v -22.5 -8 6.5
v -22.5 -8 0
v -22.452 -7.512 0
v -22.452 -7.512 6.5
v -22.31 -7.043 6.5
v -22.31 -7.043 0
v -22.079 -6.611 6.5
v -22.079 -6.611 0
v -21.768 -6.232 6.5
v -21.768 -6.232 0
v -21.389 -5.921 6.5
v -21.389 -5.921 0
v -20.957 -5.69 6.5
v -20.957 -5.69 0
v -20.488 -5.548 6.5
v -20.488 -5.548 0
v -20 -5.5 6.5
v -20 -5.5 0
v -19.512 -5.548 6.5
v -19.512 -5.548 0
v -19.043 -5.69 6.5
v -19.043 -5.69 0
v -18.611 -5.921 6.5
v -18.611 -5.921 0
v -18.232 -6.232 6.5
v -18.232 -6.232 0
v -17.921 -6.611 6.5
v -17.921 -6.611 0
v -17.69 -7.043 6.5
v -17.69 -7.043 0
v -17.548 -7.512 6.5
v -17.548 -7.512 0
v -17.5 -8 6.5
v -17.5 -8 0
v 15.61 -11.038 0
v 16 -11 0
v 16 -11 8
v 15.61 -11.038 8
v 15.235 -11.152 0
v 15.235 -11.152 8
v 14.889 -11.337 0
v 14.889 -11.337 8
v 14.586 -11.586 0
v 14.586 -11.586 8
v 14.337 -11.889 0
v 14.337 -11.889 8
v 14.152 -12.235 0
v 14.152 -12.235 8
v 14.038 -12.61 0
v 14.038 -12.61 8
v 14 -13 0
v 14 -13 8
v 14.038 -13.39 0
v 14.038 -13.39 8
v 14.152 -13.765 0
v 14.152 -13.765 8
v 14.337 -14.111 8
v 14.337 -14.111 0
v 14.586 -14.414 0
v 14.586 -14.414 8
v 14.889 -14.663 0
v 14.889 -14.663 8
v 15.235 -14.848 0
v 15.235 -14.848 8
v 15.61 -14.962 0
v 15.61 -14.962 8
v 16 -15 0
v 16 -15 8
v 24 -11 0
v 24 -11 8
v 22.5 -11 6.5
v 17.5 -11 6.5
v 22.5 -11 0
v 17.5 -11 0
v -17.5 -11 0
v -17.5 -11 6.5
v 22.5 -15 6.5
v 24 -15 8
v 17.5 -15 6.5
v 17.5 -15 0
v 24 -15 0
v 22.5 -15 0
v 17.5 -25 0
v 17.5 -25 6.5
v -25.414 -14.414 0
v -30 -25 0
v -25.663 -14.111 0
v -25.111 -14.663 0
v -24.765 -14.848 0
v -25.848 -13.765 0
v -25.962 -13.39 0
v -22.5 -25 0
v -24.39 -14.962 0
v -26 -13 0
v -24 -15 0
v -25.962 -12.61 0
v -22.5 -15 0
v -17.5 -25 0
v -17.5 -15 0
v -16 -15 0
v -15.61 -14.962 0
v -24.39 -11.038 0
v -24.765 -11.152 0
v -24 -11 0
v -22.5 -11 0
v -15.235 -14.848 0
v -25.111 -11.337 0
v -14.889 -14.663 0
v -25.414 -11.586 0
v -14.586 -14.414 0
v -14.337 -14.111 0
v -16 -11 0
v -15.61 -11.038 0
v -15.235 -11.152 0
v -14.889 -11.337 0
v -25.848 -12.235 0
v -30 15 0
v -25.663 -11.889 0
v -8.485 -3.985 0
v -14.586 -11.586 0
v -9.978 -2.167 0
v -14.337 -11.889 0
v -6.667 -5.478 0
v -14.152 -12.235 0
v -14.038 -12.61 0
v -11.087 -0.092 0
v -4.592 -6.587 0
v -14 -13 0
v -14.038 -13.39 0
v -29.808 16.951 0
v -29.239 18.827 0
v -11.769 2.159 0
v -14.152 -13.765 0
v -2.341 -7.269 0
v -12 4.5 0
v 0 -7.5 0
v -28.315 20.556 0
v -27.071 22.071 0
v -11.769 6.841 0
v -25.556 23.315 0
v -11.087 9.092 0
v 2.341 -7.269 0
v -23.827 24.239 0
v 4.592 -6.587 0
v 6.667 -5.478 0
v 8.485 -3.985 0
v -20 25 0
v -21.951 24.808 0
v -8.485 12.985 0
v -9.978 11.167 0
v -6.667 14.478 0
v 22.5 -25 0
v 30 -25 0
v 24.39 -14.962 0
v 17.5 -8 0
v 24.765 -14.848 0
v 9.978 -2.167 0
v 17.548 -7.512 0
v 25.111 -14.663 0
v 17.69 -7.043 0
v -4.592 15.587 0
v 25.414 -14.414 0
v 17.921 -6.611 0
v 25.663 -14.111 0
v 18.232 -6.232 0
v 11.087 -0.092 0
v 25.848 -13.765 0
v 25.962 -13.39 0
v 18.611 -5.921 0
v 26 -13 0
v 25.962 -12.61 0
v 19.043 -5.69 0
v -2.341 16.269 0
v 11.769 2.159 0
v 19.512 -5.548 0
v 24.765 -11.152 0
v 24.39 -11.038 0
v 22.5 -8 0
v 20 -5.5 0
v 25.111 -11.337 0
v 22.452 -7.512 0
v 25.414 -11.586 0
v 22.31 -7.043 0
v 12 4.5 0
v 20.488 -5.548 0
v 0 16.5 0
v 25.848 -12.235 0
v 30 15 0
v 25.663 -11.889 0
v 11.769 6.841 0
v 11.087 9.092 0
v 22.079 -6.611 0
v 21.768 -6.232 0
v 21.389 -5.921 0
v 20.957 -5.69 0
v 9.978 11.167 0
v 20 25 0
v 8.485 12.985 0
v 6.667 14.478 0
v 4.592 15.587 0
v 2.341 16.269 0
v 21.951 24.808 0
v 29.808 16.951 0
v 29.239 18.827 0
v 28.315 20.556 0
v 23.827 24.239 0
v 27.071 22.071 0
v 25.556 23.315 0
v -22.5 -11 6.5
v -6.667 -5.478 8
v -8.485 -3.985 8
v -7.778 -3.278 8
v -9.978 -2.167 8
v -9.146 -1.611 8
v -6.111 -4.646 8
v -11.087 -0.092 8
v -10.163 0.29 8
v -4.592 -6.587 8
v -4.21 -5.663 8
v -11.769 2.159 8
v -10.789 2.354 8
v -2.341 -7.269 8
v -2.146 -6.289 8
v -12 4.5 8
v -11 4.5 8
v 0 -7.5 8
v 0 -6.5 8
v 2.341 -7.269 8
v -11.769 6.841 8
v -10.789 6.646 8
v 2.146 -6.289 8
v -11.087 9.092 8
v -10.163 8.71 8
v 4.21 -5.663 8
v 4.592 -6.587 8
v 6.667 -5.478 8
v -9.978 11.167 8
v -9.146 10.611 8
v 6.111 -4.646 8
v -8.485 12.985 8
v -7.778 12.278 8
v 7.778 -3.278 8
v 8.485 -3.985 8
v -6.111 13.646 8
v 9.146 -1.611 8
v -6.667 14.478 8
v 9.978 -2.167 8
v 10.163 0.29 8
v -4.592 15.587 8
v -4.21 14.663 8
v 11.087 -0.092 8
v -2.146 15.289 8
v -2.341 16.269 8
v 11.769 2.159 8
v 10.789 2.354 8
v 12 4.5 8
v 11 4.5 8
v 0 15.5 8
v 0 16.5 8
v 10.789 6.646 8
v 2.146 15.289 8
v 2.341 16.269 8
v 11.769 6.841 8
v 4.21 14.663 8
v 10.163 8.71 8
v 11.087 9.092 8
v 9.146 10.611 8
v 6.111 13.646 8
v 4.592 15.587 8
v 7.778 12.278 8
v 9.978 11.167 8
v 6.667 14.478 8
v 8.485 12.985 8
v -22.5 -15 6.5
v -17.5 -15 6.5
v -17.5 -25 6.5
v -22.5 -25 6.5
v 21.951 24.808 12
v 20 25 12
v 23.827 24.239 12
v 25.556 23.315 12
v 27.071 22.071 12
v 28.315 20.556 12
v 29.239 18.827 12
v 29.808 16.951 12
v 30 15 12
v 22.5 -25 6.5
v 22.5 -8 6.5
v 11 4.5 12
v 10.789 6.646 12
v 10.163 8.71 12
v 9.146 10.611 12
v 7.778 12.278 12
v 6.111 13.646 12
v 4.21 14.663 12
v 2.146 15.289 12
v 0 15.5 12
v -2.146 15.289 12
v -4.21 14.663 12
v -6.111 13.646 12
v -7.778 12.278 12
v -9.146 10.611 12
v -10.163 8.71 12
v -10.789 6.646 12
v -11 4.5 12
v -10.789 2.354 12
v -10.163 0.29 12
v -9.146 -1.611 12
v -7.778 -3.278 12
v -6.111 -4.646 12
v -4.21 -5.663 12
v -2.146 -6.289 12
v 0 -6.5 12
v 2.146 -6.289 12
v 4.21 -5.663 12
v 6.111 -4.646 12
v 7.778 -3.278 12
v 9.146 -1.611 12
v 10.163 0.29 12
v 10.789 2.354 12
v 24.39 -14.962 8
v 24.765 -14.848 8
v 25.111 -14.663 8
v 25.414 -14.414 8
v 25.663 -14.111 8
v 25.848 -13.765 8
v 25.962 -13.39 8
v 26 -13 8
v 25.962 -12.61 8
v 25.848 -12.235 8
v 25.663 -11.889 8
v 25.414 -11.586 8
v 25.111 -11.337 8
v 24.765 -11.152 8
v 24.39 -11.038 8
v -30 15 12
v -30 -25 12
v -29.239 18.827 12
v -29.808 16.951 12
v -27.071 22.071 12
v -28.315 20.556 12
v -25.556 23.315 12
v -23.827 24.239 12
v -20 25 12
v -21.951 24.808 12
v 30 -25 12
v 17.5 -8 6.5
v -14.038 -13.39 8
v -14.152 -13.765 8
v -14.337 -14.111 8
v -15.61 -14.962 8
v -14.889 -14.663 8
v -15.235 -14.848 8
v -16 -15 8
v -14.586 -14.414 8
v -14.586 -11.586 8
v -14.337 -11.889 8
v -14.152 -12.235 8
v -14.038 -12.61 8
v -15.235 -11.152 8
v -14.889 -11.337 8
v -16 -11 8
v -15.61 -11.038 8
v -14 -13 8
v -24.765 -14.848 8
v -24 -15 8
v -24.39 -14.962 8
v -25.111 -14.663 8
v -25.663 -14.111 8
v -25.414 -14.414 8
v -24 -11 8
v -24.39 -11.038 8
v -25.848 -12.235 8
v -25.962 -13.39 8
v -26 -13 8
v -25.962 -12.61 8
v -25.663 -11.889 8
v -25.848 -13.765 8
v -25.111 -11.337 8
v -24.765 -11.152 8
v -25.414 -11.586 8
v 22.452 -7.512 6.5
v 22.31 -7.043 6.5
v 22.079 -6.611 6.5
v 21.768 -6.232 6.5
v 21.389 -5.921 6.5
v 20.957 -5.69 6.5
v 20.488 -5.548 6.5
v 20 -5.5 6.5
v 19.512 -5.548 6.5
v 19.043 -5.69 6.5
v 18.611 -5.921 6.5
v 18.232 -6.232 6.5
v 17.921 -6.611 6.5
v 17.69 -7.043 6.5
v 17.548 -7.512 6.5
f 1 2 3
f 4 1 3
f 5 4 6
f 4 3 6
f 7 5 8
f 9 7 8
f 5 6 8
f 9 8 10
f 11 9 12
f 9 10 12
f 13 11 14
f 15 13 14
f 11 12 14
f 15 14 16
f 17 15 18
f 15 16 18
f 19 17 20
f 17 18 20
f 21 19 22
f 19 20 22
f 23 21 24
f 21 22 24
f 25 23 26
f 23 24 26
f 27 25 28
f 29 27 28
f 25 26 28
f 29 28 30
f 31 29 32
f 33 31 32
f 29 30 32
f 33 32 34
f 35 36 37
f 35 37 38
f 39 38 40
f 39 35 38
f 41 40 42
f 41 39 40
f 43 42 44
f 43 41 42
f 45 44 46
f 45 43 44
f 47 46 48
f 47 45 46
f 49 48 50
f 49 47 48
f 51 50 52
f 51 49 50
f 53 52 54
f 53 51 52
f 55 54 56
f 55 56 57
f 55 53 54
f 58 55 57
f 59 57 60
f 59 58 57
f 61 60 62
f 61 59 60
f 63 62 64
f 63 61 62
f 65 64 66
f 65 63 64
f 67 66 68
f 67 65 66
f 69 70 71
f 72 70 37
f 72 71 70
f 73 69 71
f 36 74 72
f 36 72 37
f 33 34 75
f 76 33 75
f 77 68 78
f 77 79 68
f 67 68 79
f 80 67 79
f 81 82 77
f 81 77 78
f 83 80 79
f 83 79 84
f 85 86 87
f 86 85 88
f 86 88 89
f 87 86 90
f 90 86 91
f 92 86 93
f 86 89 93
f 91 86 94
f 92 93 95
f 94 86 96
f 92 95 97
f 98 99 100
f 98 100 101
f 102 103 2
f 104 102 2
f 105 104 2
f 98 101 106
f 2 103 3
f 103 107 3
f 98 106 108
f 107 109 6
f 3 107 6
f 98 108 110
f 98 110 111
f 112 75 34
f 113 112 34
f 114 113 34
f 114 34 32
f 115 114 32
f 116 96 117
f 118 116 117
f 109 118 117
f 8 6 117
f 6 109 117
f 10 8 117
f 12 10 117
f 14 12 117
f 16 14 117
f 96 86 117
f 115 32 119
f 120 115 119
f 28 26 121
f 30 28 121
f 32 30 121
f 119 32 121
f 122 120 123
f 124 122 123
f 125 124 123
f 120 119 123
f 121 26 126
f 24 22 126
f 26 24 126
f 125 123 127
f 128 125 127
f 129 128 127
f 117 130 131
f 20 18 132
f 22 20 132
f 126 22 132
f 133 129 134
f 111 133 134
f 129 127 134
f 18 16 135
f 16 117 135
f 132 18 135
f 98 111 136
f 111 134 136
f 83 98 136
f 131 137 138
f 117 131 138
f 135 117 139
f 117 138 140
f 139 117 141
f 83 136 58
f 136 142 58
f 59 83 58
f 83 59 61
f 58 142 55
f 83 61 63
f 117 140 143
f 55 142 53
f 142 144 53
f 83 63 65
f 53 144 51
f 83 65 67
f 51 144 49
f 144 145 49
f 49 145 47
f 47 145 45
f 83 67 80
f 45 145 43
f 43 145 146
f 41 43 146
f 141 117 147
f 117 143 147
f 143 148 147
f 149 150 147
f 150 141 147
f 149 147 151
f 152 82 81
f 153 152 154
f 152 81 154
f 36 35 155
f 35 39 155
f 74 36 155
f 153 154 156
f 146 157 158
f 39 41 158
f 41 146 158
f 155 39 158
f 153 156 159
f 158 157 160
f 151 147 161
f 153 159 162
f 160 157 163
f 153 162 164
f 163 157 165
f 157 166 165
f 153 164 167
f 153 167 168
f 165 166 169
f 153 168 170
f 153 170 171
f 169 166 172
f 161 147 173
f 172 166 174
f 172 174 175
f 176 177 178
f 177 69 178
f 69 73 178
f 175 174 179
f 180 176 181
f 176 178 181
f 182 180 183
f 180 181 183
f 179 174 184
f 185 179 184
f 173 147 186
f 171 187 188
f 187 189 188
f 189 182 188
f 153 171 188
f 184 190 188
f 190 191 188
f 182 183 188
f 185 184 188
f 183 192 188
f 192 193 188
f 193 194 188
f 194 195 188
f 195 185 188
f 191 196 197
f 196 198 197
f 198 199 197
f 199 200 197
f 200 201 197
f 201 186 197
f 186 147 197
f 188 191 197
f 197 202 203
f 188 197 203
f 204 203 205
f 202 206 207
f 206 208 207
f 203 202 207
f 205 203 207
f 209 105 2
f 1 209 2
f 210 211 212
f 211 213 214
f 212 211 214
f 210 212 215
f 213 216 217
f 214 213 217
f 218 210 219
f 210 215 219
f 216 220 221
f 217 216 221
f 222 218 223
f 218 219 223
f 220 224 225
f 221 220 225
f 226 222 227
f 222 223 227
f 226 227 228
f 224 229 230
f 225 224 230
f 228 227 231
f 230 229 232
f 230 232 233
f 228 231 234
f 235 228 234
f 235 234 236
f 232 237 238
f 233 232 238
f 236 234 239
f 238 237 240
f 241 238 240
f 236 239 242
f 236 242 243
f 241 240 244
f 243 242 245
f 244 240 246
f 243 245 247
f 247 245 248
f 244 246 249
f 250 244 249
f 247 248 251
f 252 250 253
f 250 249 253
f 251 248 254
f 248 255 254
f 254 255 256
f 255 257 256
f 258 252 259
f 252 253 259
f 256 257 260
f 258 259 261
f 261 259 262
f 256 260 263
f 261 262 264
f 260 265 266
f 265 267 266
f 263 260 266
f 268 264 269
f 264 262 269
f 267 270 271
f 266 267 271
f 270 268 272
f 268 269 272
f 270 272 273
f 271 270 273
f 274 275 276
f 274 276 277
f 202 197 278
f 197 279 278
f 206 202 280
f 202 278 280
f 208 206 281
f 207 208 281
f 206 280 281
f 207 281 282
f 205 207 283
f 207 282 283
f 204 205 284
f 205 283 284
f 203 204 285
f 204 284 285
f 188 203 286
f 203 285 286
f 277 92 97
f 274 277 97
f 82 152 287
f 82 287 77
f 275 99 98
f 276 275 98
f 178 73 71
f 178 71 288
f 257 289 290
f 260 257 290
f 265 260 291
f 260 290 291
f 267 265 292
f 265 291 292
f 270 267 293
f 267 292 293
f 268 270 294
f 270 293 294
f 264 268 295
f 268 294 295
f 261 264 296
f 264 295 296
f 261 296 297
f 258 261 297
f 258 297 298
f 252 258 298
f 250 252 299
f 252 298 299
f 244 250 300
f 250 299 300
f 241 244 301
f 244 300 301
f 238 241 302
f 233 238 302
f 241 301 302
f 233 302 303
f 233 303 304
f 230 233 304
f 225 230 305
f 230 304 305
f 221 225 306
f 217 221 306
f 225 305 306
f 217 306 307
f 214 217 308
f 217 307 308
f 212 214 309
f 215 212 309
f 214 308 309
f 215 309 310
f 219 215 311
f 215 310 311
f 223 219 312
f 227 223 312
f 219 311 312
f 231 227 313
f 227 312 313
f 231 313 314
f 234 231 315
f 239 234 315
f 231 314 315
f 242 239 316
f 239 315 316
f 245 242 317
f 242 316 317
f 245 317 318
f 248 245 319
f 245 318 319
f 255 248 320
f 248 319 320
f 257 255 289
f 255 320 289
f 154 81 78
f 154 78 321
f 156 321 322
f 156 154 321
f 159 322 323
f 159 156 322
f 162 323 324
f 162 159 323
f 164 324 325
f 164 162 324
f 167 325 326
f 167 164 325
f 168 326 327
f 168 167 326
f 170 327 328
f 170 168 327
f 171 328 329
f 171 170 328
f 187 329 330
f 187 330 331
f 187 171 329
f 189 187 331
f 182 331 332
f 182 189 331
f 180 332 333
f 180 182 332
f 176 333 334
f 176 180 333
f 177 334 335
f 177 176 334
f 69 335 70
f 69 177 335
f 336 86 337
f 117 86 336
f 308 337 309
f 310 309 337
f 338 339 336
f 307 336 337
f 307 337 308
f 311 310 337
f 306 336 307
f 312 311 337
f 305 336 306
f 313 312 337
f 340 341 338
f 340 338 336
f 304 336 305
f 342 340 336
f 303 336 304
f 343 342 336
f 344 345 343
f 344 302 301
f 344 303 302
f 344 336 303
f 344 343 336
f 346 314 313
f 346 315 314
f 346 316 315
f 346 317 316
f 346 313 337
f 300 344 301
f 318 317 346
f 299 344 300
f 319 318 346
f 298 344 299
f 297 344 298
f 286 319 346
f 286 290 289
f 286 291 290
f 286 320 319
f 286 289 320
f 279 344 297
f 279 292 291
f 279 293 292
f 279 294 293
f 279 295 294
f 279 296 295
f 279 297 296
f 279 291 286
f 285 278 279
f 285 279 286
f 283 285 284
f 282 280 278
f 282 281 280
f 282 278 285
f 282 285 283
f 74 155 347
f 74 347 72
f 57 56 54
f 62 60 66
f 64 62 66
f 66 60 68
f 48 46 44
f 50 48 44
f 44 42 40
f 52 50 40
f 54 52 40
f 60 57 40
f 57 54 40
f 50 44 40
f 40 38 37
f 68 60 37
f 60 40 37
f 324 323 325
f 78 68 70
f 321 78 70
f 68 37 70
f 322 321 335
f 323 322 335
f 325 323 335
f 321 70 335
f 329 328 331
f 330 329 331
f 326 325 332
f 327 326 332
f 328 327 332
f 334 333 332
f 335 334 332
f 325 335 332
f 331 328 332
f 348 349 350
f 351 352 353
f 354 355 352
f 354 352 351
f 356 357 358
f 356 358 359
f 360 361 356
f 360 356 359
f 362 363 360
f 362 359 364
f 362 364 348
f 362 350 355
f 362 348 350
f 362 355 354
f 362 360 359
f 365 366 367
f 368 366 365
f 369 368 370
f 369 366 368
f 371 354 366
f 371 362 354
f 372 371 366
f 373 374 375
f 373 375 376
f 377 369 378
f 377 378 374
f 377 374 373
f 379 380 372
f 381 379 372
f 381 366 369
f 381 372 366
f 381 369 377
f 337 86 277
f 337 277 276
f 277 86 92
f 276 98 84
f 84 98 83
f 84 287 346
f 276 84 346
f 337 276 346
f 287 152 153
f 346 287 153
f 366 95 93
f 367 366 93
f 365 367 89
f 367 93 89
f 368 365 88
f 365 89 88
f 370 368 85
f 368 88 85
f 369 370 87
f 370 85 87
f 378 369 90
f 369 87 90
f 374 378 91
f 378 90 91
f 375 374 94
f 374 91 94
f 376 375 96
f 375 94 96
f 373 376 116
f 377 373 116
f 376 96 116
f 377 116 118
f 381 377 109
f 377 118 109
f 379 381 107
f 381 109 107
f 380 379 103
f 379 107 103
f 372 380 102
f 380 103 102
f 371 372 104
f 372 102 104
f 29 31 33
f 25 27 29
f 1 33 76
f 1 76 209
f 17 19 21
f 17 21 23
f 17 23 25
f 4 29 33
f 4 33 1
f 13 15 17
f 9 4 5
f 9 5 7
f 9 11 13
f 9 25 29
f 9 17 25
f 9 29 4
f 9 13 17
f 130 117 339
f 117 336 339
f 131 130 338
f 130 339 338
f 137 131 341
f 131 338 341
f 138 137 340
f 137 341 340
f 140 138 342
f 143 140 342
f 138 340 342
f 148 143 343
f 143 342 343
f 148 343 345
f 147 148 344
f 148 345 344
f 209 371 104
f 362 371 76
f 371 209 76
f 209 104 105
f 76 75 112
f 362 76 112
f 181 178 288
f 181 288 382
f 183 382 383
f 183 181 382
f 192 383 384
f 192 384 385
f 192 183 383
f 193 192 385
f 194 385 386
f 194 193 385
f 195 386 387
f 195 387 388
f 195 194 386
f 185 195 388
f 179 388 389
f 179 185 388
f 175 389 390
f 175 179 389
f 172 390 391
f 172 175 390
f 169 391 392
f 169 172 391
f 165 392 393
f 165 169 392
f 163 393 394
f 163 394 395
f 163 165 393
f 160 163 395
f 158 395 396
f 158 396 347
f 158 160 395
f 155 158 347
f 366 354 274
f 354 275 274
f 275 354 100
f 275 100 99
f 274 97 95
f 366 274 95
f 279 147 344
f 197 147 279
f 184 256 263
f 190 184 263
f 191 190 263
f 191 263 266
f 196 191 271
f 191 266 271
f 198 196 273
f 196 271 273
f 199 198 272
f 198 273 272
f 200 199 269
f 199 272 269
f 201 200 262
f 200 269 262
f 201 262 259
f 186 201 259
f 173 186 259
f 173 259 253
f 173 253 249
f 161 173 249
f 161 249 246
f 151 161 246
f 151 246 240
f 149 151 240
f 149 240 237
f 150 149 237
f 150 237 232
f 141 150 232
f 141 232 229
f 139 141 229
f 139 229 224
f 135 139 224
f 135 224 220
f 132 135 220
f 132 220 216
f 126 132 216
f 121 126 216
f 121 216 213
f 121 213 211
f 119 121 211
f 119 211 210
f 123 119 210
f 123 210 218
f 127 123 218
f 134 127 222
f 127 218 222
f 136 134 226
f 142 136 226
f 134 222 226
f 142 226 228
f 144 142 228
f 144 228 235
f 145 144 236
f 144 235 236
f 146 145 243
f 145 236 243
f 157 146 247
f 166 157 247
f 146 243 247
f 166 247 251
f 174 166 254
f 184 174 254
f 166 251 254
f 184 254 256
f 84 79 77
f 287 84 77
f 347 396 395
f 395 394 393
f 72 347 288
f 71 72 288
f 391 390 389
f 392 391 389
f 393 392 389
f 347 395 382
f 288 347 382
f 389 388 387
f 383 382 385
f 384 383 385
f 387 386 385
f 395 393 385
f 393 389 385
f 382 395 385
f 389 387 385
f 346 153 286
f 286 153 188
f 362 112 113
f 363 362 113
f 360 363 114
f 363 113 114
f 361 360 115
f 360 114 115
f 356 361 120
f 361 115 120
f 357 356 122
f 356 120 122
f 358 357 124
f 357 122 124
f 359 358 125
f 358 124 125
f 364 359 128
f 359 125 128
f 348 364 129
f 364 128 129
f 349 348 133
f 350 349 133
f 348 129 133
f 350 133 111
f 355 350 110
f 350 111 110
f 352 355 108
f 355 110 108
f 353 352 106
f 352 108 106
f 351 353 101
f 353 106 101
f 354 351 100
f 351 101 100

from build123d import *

# Parameters (mm, degrees)
SKETCH1_W           = 60
SKETCH1_H           = 50
BOSS_EXTRUDE1_DEPTH = 12
SKETCH2_R           = 11
CUT_EXTRUDE1_DEPTH  = 4
CUT_EXTRUDE5_REACH  = 41.862
SKETCH6_R           = 12
CUT_EXTRUDE7_DEPTH  = 8
CUT_EXTRUDE8_DEPTH  = 6.5
FILLET1_R           = 10


with BuildPart() as part:
    # Sketch1 → Boss-Extrude1 (new body)
    with BuildSketch(Plane.XY):
        Rectangle(SKETCH1_W, SKETCH1_H)
    extrude(amount=BOSS_EXTRUDE1_DEPTH)

    # Sketch2 → Cut-Extrude1 (cut)
    with BuildSketch(Plane.XY.offset(12)):
        with Locations((0, 4.5)):
            Circle(SKETCH2_R)
    extrude(amount=-CUT_EXTRUDE1_DEPTH, mode=Mode.SUBTRACT)

    # Sketch6 → Cut-Extrude5 (cut, up to next)
    with BuildSketch(Plane.XY.offset(8), mode=Mode.PRIVATE) as cut_extrude5_sk1:
        with Locations((0, 4.5)):
            Circle(SKETCH6_R)
    cut_extrude5_tool1 = extrude(cut_extrude5_sk1.sketch, amount=-CUT_EXTRUDE5_REACH, mode=Mode.PRIVATE) & part.part
    add(cut_extrude5_tool1.solids().sort_by_distance((0, 4.5, 8))[0], mode=Mode.SUBTRACT)

    # Sketch9 → Cut-Extrude7 (cut)
    with BuildSketch(Plane(origin=(33.355171667, 100.110949441, 0), x_dir=(-1, 0, 0), z_dir=(0, 0, -1))):
        with BuildLine():
            Line((9.355171667, -111.110949441), (17.355171667, -111.110949441))
            ThreePointArc((17.355171667, -111.110949441), (19.355171667, -113.110949441), (17.355171667, -115.110949441))
            Line((17.355171667, -115.110949441), (9.355171667, -115.110949441))
            ThreePointArc((9.355171667, -115.110949441), (7.355171667, -113.110949441), (9.355171667, -111.110949441))
        make_face()
    cut_extrude7 = extrude(amount=-CUT_EXTRUDE7_DEPTH, mode=Mode.SUBTRACT)

    # Sketch11 → Cut-Extrude8 (cut)
    with BuildSketch(Plane(origin=(33.355171667, 100.110949441, 0), x_dir=(-1, 0, 0), z_dir=(0, 0, -1))):
        with BuildLine():
            Line((15.855171667, -108.110949441), (15.855171667, -132.025405836))
            ThreePointArc((15.855171667, -132.025405836), (13.355171667, -134.525405836), (10.855171667, -132.025405836))
            Line((10.855171667, -132.025405836), (10.855171667, -108.110949441))
            ThreePointArc((10.855171667, -108.110949441), (13.355171667, -105.610949441), (15.855171667, -108.110949441))
        make_face()
    cut_extrude8 = extrude(amount=-CUT_EXTRUDE8_DEPTH, mode=Mode.SUBTRACT)

    # Mirror1: Cut-Extrude7, Cut-Extrude8 across plane
    add(cut_extrude7.mirror(Plane(origin=(0, 0, 0), x_dir=(0, 0, 1), z_dir=(1, 0, 0))), mode=Mode.SUBTRACT)
    add(cut_extrude8.mirror(Plane(origin=(0, 0, 0), x_dir=(0, 0, 1), z_dir=(1, 0, 0))), mode=Mode.SUBTRACT)

    # Fillet1
    fillet1_edges = [part.edges().sort_by_distance(p)[0] for p in [
        (-30, 25, 6),
        (30, 25, 6),
    ]]
    fillet(fillet1_edges, radius=FILLET1_R)


solid = part.part
